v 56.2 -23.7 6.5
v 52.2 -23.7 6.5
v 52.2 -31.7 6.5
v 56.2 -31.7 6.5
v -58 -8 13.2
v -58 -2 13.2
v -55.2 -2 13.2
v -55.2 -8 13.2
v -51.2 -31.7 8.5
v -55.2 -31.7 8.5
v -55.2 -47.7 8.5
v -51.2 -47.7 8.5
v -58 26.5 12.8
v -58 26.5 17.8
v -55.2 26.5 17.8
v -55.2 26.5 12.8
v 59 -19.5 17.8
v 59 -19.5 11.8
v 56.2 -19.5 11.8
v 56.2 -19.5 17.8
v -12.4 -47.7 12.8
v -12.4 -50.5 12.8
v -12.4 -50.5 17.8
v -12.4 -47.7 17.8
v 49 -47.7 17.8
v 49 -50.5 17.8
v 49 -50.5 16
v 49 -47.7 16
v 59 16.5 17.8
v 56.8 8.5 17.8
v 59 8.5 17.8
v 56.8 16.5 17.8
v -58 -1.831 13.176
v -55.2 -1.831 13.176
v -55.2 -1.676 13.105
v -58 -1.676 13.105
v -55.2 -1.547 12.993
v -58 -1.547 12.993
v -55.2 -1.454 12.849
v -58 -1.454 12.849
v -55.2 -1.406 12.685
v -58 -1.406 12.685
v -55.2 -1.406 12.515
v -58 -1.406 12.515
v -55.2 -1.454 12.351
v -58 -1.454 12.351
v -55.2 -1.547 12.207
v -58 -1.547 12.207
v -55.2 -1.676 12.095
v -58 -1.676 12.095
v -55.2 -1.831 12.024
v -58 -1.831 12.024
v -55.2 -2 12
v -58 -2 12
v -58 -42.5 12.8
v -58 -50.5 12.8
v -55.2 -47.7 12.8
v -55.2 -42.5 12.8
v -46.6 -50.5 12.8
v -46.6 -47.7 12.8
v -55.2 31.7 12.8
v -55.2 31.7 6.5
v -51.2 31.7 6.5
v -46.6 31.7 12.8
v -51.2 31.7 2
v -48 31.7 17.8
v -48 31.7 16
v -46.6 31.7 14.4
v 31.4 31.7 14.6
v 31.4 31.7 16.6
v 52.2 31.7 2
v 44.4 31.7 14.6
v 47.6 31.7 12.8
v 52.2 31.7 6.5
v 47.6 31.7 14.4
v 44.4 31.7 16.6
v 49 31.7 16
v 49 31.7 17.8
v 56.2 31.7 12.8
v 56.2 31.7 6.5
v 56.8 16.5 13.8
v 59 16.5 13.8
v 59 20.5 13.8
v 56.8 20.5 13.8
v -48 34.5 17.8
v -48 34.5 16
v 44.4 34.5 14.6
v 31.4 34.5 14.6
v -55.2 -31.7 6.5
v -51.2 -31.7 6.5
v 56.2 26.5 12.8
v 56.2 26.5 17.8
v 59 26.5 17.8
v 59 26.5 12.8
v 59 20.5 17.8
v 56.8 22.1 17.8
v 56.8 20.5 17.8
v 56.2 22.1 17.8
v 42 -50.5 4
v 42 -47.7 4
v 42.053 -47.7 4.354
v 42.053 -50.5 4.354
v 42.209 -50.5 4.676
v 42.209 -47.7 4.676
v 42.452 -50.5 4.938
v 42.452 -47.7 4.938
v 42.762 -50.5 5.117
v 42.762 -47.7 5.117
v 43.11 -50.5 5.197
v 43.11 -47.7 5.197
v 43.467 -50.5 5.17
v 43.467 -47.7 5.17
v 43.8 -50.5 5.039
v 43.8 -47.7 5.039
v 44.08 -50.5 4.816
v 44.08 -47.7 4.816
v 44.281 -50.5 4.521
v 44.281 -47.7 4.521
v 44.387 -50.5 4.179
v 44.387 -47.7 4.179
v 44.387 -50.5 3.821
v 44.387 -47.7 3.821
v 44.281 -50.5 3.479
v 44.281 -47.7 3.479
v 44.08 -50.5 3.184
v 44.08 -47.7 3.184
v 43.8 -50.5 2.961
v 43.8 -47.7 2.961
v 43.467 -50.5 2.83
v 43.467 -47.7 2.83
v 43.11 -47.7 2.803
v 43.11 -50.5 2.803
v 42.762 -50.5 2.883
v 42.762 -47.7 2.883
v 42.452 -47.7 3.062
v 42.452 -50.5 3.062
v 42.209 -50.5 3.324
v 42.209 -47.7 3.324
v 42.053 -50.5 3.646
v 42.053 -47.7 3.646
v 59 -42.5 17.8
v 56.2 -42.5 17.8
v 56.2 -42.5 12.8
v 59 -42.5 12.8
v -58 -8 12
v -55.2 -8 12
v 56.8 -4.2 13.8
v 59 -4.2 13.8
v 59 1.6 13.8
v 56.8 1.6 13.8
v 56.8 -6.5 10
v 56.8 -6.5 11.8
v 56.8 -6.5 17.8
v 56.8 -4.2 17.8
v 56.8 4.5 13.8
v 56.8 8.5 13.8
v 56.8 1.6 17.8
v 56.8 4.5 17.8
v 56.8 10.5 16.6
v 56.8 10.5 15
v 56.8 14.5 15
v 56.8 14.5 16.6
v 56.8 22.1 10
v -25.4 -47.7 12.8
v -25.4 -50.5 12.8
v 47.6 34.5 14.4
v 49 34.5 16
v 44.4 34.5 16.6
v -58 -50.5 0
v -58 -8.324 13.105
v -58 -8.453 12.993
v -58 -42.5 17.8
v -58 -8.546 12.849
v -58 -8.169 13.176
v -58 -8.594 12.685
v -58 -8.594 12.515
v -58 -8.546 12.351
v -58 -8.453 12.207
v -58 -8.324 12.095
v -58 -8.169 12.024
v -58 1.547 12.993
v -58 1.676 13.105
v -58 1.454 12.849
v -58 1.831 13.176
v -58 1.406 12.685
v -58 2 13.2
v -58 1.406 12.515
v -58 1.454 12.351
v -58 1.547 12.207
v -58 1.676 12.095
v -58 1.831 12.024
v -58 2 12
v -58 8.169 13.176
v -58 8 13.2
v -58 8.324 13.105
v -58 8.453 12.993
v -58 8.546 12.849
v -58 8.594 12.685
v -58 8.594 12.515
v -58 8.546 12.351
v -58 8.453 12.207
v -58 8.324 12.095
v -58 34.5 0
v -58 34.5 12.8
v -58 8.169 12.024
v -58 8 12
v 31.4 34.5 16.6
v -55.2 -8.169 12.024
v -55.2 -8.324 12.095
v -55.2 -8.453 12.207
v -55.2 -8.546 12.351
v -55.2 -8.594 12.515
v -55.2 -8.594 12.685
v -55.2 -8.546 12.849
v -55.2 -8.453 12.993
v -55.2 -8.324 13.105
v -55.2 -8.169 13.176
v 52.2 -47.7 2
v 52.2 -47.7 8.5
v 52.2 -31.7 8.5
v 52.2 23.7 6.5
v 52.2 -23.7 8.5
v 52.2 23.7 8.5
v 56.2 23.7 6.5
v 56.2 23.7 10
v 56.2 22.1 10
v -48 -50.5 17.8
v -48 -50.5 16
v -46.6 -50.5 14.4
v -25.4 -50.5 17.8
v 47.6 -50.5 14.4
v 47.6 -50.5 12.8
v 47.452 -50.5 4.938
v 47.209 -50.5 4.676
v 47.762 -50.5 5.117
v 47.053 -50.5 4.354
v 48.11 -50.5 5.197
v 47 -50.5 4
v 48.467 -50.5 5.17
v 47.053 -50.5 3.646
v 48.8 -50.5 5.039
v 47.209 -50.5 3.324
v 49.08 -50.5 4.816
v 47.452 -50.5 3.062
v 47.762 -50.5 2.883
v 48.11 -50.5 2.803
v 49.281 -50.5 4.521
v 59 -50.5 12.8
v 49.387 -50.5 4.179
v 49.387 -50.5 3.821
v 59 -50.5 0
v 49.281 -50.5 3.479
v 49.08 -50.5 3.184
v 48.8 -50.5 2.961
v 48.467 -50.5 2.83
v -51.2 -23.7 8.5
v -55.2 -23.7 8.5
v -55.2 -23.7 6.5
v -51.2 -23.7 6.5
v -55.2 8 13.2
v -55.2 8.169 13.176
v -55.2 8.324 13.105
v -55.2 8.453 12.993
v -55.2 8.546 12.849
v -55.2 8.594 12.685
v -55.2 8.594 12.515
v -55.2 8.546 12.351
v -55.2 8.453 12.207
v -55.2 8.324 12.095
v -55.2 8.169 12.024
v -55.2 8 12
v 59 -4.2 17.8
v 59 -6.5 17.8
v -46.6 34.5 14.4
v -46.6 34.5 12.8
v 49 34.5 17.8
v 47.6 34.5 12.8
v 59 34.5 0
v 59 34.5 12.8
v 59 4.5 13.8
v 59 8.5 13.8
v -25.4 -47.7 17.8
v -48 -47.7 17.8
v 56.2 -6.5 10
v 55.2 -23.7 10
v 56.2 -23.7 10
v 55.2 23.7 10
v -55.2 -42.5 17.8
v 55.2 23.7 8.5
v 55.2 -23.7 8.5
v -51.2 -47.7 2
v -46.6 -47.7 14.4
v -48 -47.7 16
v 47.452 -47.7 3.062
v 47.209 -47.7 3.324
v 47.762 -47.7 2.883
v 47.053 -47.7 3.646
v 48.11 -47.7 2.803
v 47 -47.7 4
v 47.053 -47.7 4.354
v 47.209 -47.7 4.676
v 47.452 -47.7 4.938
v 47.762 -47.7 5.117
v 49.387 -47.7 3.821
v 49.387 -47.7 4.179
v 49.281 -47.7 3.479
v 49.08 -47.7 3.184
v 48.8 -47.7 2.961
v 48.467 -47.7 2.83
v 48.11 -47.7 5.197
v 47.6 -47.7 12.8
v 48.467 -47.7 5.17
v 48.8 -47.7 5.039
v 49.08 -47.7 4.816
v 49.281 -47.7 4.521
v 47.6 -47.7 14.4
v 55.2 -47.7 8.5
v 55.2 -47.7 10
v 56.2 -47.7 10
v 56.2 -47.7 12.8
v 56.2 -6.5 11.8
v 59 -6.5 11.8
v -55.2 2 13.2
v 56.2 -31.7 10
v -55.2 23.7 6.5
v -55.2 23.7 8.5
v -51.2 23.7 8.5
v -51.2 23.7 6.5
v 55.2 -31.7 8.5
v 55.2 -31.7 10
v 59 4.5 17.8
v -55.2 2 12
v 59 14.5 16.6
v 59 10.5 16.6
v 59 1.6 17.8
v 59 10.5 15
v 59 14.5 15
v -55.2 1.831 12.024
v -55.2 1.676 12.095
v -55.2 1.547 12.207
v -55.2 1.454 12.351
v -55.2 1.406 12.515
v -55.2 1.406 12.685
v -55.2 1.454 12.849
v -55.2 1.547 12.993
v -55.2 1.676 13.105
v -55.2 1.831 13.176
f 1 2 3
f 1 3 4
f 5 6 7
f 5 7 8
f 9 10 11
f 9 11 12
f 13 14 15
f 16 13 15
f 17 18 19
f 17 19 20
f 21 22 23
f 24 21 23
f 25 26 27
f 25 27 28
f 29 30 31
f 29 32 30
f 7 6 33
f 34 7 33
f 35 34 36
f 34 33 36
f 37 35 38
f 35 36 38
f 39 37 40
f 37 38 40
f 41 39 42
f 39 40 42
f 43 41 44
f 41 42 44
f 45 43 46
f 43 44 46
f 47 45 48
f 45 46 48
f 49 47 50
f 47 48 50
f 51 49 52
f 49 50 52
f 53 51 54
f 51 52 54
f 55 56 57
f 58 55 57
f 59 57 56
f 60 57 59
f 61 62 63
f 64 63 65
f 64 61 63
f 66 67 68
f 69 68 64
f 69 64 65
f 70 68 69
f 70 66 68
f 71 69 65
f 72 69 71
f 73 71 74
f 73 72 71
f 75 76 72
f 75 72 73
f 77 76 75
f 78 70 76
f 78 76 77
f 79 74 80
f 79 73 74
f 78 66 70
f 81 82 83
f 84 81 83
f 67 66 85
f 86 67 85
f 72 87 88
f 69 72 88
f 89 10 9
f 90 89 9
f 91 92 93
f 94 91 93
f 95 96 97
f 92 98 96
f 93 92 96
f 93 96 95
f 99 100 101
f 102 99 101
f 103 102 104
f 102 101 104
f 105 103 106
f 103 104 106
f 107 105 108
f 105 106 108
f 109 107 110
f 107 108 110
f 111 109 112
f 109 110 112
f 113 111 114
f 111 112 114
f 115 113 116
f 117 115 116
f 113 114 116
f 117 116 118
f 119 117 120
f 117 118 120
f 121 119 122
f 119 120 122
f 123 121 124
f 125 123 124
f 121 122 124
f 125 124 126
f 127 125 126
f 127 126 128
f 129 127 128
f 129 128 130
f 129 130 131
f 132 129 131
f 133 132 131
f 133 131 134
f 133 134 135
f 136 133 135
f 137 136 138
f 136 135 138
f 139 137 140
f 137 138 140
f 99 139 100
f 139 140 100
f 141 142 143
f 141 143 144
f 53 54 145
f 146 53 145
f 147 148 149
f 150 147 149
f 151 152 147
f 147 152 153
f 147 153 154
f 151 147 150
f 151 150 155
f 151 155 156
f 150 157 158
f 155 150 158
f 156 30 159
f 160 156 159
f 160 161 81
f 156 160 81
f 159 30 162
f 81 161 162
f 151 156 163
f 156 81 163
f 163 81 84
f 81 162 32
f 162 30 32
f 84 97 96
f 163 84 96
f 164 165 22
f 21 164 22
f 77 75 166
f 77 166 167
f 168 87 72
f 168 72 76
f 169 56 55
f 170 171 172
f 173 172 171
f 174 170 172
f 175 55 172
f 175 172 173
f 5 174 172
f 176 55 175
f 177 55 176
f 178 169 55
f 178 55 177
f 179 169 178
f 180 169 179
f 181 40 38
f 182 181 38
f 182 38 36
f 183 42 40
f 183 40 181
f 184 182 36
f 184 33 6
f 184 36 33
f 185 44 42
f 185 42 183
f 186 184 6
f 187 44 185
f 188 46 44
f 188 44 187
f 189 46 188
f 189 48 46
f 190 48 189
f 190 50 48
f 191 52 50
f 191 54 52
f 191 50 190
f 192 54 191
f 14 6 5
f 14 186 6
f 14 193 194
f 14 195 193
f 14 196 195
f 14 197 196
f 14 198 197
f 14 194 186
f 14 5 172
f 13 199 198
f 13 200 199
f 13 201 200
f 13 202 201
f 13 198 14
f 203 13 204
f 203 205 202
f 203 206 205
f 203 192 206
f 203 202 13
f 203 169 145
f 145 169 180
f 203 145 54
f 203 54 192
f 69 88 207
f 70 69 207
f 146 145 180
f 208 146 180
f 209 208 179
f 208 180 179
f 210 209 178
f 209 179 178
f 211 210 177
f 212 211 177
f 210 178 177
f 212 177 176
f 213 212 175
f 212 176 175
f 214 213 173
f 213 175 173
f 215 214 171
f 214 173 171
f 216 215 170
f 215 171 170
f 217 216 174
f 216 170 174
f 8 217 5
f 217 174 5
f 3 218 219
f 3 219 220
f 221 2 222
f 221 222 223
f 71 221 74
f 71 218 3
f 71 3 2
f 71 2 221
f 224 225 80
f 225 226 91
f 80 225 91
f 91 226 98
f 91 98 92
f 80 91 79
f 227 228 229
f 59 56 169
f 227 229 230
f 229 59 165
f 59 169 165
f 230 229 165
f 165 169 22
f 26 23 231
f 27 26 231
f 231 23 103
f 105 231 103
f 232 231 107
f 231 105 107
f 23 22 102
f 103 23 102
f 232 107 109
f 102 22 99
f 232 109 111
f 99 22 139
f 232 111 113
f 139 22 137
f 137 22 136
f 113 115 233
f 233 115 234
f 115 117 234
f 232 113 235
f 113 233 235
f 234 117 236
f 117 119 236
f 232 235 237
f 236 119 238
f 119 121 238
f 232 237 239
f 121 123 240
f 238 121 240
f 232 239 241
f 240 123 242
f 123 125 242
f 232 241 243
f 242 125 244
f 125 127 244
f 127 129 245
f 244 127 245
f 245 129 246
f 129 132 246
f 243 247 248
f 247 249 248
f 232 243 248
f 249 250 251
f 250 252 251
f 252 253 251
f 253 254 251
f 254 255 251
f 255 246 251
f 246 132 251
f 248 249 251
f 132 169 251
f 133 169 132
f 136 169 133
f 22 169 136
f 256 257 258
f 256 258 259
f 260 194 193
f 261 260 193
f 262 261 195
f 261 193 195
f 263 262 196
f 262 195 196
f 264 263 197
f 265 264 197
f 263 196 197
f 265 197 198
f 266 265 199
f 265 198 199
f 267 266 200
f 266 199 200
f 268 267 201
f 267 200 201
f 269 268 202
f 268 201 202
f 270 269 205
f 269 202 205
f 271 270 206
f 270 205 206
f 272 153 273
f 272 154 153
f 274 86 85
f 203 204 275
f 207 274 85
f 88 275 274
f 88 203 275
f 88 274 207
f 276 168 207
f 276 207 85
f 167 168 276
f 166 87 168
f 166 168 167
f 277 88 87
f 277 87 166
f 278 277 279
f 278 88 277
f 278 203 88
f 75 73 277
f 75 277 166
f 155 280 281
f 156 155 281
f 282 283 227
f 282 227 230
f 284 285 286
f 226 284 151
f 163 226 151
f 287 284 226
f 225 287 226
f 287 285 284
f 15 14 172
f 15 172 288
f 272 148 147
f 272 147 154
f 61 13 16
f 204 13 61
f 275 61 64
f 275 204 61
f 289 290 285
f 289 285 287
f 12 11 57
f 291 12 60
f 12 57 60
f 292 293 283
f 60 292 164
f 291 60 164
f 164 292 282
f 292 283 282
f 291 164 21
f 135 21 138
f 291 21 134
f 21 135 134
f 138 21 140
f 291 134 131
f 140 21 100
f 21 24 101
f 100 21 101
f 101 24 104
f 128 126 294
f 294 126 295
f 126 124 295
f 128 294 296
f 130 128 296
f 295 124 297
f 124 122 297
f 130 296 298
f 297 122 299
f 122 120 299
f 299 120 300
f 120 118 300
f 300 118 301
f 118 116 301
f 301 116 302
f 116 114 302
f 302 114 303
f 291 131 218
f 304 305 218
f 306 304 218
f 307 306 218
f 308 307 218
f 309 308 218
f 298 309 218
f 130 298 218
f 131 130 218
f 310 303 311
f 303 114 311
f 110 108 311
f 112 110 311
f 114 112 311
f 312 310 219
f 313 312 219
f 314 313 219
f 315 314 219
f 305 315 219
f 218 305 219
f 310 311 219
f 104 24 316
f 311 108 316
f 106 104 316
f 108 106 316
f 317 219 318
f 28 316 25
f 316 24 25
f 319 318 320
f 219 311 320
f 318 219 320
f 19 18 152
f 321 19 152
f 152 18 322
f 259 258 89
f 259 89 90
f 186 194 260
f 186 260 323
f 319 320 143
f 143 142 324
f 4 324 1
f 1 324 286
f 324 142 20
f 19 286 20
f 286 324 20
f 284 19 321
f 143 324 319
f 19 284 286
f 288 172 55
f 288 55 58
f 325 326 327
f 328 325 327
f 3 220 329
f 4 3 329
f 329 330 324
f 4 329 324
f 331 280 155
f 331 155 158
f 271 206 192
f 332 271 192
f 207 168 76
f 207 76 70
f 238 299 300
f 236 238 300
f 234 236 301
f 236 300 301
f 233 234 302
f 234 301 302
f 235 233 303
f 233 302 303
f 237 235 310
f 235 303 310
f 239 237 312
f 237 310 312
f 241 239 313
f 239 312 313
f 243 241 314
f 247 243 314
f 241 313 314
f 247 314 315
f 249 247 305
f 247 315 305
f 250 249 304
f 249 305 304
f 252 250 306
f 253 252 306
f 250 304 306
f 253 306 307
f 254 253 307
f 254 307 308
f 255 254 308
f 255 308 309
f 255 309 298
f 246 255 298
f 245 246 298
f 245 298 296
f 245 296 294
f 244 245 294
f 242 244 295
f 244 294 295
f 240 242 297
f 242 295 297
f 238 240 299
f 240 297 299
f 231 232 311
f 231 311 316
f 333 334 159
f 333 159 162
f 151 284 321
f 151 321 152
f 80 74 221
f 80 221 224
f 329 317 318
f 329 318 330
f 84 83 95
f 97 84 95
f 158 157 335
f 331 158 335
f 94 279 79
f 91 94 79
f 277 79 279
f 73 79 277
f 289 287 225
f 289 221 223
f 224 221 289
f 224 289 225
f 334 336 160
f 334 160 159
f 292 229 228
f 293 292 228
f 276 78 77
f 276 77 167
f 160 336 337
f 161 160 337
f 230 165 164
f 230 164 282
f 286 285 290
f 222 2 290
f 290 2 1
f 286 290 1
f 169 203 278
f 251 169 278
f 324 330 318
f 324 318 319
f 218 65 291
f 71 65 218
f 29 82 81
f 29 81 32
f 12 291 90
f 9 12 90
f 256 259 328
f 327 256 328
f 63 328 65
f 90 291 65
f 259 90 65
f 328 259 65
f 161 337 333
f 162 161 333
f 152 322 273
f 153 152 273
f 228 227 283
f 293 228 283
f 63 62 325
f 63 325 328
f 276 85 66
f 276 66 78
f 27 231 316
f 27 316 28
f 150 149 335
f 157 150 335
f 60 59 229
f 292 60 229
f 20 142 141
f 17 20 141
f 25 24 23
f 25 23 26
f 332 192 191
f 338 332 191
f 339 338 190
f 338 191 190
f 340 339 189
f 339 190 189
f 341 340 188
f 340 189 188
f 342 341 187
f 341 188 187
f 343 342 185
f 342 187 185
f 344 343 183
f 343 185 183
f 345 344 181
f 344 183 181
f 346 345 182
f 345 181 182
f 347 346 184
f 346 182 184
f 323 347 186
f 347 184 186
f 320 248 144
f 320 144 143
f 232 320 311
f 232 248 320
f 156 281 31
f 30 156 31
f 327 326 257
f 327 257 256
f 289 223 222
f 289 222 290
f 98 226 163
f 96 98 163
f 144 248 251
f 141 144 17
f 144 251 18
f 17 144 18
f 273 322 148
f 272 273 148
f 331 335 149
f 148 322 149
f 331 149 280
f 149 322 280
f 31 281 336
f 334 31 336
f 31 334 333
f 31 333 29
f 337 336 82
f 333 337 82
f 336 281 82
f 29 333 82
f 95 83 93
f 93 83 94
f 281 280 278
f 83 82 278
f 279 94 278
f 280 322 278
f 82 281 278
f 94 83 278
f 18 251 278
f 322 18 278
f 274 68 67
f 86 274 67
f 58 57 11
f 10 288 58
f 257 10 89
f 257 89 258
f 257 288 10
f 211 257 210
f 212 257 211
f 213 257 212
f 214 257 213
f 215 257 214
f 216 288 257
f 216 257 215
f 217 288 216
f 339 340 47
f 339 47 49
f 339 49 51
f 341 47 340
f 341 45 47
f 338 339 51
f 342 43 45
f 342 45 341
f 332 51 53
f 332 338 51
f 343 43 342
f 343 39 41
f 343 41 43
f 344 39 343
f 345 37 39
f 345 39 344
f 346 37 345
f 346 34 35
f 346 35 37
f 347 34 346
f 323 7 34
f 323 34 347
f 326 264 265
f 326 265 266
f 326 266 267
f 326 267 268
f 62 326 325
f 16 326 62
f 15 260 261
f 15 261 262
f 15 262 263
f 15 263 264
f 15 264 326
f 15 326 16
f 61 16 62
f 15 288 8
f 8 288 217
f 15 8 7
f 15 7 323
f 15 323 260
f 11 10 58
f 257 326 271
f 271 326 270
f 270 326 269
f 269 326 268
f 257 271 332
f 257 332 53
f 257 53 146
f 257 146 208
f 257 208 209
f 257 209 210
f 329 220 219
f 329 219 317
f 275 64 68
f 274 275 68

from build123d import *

# Parameters (mm, degrees)
SKETCH021_W     = 117
SKETCH021_H     = 85
PAD012_DEPTH    = 17.8
SKETCH025_W     = 111.4
SKETCH025_H     = 79.4
POCKET003_DEPTH = 15.8
SKETCH026_W     = 4
SKETCH026_H     = 79.4
PAD014_DEPTH    = 6.5
SKETCH027_W     = 4
SKETCH027_H     = 8
POCKET004_DEPTH = 2
SKETCH028_W     = 13
SKETCH028_H     = 6
SKETCH028_W_2   = 5.8
SKETCH028_H_2   = 4
SKETCH028_W_3   = 4
SKETCH028_H_3   = 1.6
POCKET005_DEPTH = 2.8
SKETCH029_W     = 0.6
SKETCH029_H     = 28.3
POCKET006_DEPTH = 7.8
SKETCH030_W     = 13
SKETCH030_H     = 2
POCKET007_DEPTH = 2.8
SKETCH032_R     = 1.2
POCKET009_DEPTH = 2.8
SKETCH037_W     = 10
SKETCH037_H     = 8
POCKET012_DEPTH = 5
POCKET015_DEPTH = 85.001
SKETCH056_W     = 1
SKETCH056_H     = 47.4
SKETCH056_H_2   = 16
PAD026_DEPTH    = 1.5
SKETCH057_W     = 0.6
SKETCH057_H     = 0.3
POCKET019_DEPTH = 7.8
POCKET020_DEPTH = 2.8
SKETCH059_W     = 13
SKETCH059_H     = 5
POCKET021_DEPTH = 2.8


with BuildPart() as part:
    # Sketch021 → Pad012 (new body)
    with BuildSketch(Plane.XY):
        with Locations((0.5, -8)):
            Rectangle(SKETCH021_W, SKETCH021_H)
    extrude(amount=PAD012_DEPTH)

    # Sketch025 (on Face6 of Pad012) → Pocket003 (cut)
    with BuildSketch(Plane.XY.offset(17.8)):
        with Locations((0.5, -8)):
            Rectangle(SKETCH025_W, SKETCH025_H)
    extrude(amount=-POCKET003_DEPTH, mode=Mode.SUBTRACT)

    # Sketch026 (on Face11 of Pocket003) → Pad014 (join)
    with BuildSketch(Plane.XY.offset(2)):
        with Locations((-53.2, -8)):
            Rectangle(SKETCH026_W, SKETCH026_H)
        with Locations((54.2, -8)):
            Rectangle(SKETCH026_W, SKETCH026_H)
    extrude(amount=PAD014_DEPTH)

    # Sketch027 (on Face15 of Pad014) → Pocket004 (cut)
    with BuildSketch(Plane.XY.offset(8.5)):
        with Locations((-53.2, 27.7)):
            Rectangle(SKETCH027_W, SKETCH027_H)
        with Locations((54.2, 27.7)):
            Rectangle(SKETCH027_W, SKETCH027_H)
        with Locations((-53.2, -27.7)):
            Rectangle(SKETCH027_W, SKETCH027_H)
        with Locations((54.2, -27.7)):
            Rectangle(SKETCH027_W, SKETCH027_H)
    extrude(amount=-POCKET004_DEPTH, mode=Mode.SUBTRACT)

    # Sketch028 (on Face3 of Pocket004) → Pocket005 (cut)
    with BuildSketch(Plane.YZ.offset(59)):
        with Locations((-13, 14.8)):
            Rectangle(SKETCH028_W, SKETCH028_H)
        with Locations((-1.3, 15.8)):
            Rectangle(SKETCH028_W_2, SKETCH028_H_2)
        with Locations((6.5, 15.8)):
            Rectangle(SKETCH028_W_3, SKETCH028_H_2)
        with Locations((18.5, 15.8)):
            Rectangle(SKETCH028_W_3, SKETCH028_H_2)
        with Locations((12.5, 15.8)):
            Rectangle(SKETCH028_W_3, SKETCH028_H_3)
    extrude(amount=-POCKET005_DEPTH, mode=Mode.SUBTRACT)

    # Sketch029 (on Face18 of Pocket005) → Pocket006 (cut)
    with BuildSketch(Plane.XY.offset(17.8)):
        with Locations((56.5, 7.95)):
            Rectangle(SKETCH029_W, SKETCH029_H)
    extrude(amount=-POCKET006_DEPTH, mode=Mode.SUBTRACT)

    # Sketch030 (on Face1 of Pocket006) → Pocket007 (cut)
    with BuildSketch(Plane(origin=(0, 34.5, 0), x_dir=(-1, 0, 0), z_dir=(0, 1, 0))):
        with Locations((-37.9, 15.6)):
            Rectangle(SKETCH030_W, SKETCH030_H)
    extrude(amount=-POCKET007_DEPTH, mode=Mode.SUBTRACT)

    # Sketch032 (on Face13 of Pocket007) → Pocket009 (cut)
    with BuildSketch(Plane(origin=(0, -47.7, 0), x_dir=(-1, 0, 0), z_dir=(0, 1, 0))):
        with Locations((-48.2, 4)):
            Circle(SKETCH032_R)
        with Locations((-43.2, 4)):
            Circle(SKETCH032_R)
    extrude(amount=-POCKET009_DEPTH, mode=Mode.SUBTRACT)

    # Sketch037 (on Face4 of Pocket009) → Pocket012 (cut)
    with BuildSketch(Plane.XY.offset(17.8)):
        with Locations((-53, 30.5)):
            Rectangle(SKETCH037_W, SKETCH037_H)
        with Locations((54, 30.5)):
            Rectangle(SKETCH037_W, SKETCH037_H)
        with Locations((-53, -46.5)):
            Rectangle(SKETCH037_W, SKETCH037_H)
        with Locations((54, -46.5)):
            Rectangle(SKETCH037_W, SKETCH037_H)
    extrude(amount=-POCKET012_DEPTH, mode=Mode.SUBTRACT)

    # Sketch043 (on Face14 of Pocket012) → Pocket015 (cut, through all)
    with BuildSketch(Plane.XZ.offset(50.5)):
        Polygon((-48, 12.8), (-46.6, 12.8), (-46.6, 14.4), (-48, 16), align=None)
        Polygon((49, 12.8), (47.6, 12.8), (47.6, 14.4), (49, 16), align=None)
    extrude(amount=-POCKET015_DEPTH, mode=Mode.SUBTRACT)

    # Sketch056 (on Face70 of Pocket015) → Pad026 (join)
    with BuildSketch(Plane.XY.offset(8.5)):
        with Locations((55.7, 0)):
            Rectangle(SKETCH056_W, SKETCH056_H)
        with Locations((55.7, -39.7)):
            Rectangle(SKETCH056_W, SKETCH056_H_2)
    extrude(amount=PAD026_DEPTH)

    # Sketch057 (on Face27 of Pad026) → Pocket019 (cut)
    with BuildSketch(Plane.XY.offset(17.8)):
        with Locations((56.5, -6.35)):
            Rectangle(SKETCH057_W, SKETCH057_H)
    extrude(amount=-POCKET019_DEPTH, mode=Mode.SUBTRACT)

    # Sketch058 (on Face15 of Pocket019) → Pocket020 (cut)
    with BuildSketch(Plane(origin=(-58, 0, 0), x_dir=(0, -1, 0), z_dir=(-1, 0, 0))):
        with BuildLine():
            ThreePointArc((-8, 13.2), (-8.6, 12.6), (-8, 12))
            Line((-8, 12), (-2, 12))
            ThreePointArc((-2, 12), (-1.4, 12.6), (-2, 13.2))
            Line((-8, 13.2), (-2, 13.2))
        make_face()
        with BuildLine():
            ThreePointArc((2, 13.2), (1.4, 12.6), (2, 12))
            Line((2, 12), (8, 12))
            ThreePointArc((8, 12), (8.6, 12.6), (8, 13.2))
            Line((2, 13.2), (8, 13.2))
        make_face()
    extrude(amount=-POCKET020_DEPTH, mode=Mode.SUBTRACT)

    # Sketch059 (on Face20 of Pocket020) → Pocket021 (cut)
    with BuildSketch(Plane.XZ.offset(50.5)):
        with Locations((-18.9, 15.3)):
            Rectangle(SKETCH059_W, SKETCH059_H)
    extrude(amount=-POCKET021_DEPTH, mode=Mode.SUBTRACT)


solid = part.part
